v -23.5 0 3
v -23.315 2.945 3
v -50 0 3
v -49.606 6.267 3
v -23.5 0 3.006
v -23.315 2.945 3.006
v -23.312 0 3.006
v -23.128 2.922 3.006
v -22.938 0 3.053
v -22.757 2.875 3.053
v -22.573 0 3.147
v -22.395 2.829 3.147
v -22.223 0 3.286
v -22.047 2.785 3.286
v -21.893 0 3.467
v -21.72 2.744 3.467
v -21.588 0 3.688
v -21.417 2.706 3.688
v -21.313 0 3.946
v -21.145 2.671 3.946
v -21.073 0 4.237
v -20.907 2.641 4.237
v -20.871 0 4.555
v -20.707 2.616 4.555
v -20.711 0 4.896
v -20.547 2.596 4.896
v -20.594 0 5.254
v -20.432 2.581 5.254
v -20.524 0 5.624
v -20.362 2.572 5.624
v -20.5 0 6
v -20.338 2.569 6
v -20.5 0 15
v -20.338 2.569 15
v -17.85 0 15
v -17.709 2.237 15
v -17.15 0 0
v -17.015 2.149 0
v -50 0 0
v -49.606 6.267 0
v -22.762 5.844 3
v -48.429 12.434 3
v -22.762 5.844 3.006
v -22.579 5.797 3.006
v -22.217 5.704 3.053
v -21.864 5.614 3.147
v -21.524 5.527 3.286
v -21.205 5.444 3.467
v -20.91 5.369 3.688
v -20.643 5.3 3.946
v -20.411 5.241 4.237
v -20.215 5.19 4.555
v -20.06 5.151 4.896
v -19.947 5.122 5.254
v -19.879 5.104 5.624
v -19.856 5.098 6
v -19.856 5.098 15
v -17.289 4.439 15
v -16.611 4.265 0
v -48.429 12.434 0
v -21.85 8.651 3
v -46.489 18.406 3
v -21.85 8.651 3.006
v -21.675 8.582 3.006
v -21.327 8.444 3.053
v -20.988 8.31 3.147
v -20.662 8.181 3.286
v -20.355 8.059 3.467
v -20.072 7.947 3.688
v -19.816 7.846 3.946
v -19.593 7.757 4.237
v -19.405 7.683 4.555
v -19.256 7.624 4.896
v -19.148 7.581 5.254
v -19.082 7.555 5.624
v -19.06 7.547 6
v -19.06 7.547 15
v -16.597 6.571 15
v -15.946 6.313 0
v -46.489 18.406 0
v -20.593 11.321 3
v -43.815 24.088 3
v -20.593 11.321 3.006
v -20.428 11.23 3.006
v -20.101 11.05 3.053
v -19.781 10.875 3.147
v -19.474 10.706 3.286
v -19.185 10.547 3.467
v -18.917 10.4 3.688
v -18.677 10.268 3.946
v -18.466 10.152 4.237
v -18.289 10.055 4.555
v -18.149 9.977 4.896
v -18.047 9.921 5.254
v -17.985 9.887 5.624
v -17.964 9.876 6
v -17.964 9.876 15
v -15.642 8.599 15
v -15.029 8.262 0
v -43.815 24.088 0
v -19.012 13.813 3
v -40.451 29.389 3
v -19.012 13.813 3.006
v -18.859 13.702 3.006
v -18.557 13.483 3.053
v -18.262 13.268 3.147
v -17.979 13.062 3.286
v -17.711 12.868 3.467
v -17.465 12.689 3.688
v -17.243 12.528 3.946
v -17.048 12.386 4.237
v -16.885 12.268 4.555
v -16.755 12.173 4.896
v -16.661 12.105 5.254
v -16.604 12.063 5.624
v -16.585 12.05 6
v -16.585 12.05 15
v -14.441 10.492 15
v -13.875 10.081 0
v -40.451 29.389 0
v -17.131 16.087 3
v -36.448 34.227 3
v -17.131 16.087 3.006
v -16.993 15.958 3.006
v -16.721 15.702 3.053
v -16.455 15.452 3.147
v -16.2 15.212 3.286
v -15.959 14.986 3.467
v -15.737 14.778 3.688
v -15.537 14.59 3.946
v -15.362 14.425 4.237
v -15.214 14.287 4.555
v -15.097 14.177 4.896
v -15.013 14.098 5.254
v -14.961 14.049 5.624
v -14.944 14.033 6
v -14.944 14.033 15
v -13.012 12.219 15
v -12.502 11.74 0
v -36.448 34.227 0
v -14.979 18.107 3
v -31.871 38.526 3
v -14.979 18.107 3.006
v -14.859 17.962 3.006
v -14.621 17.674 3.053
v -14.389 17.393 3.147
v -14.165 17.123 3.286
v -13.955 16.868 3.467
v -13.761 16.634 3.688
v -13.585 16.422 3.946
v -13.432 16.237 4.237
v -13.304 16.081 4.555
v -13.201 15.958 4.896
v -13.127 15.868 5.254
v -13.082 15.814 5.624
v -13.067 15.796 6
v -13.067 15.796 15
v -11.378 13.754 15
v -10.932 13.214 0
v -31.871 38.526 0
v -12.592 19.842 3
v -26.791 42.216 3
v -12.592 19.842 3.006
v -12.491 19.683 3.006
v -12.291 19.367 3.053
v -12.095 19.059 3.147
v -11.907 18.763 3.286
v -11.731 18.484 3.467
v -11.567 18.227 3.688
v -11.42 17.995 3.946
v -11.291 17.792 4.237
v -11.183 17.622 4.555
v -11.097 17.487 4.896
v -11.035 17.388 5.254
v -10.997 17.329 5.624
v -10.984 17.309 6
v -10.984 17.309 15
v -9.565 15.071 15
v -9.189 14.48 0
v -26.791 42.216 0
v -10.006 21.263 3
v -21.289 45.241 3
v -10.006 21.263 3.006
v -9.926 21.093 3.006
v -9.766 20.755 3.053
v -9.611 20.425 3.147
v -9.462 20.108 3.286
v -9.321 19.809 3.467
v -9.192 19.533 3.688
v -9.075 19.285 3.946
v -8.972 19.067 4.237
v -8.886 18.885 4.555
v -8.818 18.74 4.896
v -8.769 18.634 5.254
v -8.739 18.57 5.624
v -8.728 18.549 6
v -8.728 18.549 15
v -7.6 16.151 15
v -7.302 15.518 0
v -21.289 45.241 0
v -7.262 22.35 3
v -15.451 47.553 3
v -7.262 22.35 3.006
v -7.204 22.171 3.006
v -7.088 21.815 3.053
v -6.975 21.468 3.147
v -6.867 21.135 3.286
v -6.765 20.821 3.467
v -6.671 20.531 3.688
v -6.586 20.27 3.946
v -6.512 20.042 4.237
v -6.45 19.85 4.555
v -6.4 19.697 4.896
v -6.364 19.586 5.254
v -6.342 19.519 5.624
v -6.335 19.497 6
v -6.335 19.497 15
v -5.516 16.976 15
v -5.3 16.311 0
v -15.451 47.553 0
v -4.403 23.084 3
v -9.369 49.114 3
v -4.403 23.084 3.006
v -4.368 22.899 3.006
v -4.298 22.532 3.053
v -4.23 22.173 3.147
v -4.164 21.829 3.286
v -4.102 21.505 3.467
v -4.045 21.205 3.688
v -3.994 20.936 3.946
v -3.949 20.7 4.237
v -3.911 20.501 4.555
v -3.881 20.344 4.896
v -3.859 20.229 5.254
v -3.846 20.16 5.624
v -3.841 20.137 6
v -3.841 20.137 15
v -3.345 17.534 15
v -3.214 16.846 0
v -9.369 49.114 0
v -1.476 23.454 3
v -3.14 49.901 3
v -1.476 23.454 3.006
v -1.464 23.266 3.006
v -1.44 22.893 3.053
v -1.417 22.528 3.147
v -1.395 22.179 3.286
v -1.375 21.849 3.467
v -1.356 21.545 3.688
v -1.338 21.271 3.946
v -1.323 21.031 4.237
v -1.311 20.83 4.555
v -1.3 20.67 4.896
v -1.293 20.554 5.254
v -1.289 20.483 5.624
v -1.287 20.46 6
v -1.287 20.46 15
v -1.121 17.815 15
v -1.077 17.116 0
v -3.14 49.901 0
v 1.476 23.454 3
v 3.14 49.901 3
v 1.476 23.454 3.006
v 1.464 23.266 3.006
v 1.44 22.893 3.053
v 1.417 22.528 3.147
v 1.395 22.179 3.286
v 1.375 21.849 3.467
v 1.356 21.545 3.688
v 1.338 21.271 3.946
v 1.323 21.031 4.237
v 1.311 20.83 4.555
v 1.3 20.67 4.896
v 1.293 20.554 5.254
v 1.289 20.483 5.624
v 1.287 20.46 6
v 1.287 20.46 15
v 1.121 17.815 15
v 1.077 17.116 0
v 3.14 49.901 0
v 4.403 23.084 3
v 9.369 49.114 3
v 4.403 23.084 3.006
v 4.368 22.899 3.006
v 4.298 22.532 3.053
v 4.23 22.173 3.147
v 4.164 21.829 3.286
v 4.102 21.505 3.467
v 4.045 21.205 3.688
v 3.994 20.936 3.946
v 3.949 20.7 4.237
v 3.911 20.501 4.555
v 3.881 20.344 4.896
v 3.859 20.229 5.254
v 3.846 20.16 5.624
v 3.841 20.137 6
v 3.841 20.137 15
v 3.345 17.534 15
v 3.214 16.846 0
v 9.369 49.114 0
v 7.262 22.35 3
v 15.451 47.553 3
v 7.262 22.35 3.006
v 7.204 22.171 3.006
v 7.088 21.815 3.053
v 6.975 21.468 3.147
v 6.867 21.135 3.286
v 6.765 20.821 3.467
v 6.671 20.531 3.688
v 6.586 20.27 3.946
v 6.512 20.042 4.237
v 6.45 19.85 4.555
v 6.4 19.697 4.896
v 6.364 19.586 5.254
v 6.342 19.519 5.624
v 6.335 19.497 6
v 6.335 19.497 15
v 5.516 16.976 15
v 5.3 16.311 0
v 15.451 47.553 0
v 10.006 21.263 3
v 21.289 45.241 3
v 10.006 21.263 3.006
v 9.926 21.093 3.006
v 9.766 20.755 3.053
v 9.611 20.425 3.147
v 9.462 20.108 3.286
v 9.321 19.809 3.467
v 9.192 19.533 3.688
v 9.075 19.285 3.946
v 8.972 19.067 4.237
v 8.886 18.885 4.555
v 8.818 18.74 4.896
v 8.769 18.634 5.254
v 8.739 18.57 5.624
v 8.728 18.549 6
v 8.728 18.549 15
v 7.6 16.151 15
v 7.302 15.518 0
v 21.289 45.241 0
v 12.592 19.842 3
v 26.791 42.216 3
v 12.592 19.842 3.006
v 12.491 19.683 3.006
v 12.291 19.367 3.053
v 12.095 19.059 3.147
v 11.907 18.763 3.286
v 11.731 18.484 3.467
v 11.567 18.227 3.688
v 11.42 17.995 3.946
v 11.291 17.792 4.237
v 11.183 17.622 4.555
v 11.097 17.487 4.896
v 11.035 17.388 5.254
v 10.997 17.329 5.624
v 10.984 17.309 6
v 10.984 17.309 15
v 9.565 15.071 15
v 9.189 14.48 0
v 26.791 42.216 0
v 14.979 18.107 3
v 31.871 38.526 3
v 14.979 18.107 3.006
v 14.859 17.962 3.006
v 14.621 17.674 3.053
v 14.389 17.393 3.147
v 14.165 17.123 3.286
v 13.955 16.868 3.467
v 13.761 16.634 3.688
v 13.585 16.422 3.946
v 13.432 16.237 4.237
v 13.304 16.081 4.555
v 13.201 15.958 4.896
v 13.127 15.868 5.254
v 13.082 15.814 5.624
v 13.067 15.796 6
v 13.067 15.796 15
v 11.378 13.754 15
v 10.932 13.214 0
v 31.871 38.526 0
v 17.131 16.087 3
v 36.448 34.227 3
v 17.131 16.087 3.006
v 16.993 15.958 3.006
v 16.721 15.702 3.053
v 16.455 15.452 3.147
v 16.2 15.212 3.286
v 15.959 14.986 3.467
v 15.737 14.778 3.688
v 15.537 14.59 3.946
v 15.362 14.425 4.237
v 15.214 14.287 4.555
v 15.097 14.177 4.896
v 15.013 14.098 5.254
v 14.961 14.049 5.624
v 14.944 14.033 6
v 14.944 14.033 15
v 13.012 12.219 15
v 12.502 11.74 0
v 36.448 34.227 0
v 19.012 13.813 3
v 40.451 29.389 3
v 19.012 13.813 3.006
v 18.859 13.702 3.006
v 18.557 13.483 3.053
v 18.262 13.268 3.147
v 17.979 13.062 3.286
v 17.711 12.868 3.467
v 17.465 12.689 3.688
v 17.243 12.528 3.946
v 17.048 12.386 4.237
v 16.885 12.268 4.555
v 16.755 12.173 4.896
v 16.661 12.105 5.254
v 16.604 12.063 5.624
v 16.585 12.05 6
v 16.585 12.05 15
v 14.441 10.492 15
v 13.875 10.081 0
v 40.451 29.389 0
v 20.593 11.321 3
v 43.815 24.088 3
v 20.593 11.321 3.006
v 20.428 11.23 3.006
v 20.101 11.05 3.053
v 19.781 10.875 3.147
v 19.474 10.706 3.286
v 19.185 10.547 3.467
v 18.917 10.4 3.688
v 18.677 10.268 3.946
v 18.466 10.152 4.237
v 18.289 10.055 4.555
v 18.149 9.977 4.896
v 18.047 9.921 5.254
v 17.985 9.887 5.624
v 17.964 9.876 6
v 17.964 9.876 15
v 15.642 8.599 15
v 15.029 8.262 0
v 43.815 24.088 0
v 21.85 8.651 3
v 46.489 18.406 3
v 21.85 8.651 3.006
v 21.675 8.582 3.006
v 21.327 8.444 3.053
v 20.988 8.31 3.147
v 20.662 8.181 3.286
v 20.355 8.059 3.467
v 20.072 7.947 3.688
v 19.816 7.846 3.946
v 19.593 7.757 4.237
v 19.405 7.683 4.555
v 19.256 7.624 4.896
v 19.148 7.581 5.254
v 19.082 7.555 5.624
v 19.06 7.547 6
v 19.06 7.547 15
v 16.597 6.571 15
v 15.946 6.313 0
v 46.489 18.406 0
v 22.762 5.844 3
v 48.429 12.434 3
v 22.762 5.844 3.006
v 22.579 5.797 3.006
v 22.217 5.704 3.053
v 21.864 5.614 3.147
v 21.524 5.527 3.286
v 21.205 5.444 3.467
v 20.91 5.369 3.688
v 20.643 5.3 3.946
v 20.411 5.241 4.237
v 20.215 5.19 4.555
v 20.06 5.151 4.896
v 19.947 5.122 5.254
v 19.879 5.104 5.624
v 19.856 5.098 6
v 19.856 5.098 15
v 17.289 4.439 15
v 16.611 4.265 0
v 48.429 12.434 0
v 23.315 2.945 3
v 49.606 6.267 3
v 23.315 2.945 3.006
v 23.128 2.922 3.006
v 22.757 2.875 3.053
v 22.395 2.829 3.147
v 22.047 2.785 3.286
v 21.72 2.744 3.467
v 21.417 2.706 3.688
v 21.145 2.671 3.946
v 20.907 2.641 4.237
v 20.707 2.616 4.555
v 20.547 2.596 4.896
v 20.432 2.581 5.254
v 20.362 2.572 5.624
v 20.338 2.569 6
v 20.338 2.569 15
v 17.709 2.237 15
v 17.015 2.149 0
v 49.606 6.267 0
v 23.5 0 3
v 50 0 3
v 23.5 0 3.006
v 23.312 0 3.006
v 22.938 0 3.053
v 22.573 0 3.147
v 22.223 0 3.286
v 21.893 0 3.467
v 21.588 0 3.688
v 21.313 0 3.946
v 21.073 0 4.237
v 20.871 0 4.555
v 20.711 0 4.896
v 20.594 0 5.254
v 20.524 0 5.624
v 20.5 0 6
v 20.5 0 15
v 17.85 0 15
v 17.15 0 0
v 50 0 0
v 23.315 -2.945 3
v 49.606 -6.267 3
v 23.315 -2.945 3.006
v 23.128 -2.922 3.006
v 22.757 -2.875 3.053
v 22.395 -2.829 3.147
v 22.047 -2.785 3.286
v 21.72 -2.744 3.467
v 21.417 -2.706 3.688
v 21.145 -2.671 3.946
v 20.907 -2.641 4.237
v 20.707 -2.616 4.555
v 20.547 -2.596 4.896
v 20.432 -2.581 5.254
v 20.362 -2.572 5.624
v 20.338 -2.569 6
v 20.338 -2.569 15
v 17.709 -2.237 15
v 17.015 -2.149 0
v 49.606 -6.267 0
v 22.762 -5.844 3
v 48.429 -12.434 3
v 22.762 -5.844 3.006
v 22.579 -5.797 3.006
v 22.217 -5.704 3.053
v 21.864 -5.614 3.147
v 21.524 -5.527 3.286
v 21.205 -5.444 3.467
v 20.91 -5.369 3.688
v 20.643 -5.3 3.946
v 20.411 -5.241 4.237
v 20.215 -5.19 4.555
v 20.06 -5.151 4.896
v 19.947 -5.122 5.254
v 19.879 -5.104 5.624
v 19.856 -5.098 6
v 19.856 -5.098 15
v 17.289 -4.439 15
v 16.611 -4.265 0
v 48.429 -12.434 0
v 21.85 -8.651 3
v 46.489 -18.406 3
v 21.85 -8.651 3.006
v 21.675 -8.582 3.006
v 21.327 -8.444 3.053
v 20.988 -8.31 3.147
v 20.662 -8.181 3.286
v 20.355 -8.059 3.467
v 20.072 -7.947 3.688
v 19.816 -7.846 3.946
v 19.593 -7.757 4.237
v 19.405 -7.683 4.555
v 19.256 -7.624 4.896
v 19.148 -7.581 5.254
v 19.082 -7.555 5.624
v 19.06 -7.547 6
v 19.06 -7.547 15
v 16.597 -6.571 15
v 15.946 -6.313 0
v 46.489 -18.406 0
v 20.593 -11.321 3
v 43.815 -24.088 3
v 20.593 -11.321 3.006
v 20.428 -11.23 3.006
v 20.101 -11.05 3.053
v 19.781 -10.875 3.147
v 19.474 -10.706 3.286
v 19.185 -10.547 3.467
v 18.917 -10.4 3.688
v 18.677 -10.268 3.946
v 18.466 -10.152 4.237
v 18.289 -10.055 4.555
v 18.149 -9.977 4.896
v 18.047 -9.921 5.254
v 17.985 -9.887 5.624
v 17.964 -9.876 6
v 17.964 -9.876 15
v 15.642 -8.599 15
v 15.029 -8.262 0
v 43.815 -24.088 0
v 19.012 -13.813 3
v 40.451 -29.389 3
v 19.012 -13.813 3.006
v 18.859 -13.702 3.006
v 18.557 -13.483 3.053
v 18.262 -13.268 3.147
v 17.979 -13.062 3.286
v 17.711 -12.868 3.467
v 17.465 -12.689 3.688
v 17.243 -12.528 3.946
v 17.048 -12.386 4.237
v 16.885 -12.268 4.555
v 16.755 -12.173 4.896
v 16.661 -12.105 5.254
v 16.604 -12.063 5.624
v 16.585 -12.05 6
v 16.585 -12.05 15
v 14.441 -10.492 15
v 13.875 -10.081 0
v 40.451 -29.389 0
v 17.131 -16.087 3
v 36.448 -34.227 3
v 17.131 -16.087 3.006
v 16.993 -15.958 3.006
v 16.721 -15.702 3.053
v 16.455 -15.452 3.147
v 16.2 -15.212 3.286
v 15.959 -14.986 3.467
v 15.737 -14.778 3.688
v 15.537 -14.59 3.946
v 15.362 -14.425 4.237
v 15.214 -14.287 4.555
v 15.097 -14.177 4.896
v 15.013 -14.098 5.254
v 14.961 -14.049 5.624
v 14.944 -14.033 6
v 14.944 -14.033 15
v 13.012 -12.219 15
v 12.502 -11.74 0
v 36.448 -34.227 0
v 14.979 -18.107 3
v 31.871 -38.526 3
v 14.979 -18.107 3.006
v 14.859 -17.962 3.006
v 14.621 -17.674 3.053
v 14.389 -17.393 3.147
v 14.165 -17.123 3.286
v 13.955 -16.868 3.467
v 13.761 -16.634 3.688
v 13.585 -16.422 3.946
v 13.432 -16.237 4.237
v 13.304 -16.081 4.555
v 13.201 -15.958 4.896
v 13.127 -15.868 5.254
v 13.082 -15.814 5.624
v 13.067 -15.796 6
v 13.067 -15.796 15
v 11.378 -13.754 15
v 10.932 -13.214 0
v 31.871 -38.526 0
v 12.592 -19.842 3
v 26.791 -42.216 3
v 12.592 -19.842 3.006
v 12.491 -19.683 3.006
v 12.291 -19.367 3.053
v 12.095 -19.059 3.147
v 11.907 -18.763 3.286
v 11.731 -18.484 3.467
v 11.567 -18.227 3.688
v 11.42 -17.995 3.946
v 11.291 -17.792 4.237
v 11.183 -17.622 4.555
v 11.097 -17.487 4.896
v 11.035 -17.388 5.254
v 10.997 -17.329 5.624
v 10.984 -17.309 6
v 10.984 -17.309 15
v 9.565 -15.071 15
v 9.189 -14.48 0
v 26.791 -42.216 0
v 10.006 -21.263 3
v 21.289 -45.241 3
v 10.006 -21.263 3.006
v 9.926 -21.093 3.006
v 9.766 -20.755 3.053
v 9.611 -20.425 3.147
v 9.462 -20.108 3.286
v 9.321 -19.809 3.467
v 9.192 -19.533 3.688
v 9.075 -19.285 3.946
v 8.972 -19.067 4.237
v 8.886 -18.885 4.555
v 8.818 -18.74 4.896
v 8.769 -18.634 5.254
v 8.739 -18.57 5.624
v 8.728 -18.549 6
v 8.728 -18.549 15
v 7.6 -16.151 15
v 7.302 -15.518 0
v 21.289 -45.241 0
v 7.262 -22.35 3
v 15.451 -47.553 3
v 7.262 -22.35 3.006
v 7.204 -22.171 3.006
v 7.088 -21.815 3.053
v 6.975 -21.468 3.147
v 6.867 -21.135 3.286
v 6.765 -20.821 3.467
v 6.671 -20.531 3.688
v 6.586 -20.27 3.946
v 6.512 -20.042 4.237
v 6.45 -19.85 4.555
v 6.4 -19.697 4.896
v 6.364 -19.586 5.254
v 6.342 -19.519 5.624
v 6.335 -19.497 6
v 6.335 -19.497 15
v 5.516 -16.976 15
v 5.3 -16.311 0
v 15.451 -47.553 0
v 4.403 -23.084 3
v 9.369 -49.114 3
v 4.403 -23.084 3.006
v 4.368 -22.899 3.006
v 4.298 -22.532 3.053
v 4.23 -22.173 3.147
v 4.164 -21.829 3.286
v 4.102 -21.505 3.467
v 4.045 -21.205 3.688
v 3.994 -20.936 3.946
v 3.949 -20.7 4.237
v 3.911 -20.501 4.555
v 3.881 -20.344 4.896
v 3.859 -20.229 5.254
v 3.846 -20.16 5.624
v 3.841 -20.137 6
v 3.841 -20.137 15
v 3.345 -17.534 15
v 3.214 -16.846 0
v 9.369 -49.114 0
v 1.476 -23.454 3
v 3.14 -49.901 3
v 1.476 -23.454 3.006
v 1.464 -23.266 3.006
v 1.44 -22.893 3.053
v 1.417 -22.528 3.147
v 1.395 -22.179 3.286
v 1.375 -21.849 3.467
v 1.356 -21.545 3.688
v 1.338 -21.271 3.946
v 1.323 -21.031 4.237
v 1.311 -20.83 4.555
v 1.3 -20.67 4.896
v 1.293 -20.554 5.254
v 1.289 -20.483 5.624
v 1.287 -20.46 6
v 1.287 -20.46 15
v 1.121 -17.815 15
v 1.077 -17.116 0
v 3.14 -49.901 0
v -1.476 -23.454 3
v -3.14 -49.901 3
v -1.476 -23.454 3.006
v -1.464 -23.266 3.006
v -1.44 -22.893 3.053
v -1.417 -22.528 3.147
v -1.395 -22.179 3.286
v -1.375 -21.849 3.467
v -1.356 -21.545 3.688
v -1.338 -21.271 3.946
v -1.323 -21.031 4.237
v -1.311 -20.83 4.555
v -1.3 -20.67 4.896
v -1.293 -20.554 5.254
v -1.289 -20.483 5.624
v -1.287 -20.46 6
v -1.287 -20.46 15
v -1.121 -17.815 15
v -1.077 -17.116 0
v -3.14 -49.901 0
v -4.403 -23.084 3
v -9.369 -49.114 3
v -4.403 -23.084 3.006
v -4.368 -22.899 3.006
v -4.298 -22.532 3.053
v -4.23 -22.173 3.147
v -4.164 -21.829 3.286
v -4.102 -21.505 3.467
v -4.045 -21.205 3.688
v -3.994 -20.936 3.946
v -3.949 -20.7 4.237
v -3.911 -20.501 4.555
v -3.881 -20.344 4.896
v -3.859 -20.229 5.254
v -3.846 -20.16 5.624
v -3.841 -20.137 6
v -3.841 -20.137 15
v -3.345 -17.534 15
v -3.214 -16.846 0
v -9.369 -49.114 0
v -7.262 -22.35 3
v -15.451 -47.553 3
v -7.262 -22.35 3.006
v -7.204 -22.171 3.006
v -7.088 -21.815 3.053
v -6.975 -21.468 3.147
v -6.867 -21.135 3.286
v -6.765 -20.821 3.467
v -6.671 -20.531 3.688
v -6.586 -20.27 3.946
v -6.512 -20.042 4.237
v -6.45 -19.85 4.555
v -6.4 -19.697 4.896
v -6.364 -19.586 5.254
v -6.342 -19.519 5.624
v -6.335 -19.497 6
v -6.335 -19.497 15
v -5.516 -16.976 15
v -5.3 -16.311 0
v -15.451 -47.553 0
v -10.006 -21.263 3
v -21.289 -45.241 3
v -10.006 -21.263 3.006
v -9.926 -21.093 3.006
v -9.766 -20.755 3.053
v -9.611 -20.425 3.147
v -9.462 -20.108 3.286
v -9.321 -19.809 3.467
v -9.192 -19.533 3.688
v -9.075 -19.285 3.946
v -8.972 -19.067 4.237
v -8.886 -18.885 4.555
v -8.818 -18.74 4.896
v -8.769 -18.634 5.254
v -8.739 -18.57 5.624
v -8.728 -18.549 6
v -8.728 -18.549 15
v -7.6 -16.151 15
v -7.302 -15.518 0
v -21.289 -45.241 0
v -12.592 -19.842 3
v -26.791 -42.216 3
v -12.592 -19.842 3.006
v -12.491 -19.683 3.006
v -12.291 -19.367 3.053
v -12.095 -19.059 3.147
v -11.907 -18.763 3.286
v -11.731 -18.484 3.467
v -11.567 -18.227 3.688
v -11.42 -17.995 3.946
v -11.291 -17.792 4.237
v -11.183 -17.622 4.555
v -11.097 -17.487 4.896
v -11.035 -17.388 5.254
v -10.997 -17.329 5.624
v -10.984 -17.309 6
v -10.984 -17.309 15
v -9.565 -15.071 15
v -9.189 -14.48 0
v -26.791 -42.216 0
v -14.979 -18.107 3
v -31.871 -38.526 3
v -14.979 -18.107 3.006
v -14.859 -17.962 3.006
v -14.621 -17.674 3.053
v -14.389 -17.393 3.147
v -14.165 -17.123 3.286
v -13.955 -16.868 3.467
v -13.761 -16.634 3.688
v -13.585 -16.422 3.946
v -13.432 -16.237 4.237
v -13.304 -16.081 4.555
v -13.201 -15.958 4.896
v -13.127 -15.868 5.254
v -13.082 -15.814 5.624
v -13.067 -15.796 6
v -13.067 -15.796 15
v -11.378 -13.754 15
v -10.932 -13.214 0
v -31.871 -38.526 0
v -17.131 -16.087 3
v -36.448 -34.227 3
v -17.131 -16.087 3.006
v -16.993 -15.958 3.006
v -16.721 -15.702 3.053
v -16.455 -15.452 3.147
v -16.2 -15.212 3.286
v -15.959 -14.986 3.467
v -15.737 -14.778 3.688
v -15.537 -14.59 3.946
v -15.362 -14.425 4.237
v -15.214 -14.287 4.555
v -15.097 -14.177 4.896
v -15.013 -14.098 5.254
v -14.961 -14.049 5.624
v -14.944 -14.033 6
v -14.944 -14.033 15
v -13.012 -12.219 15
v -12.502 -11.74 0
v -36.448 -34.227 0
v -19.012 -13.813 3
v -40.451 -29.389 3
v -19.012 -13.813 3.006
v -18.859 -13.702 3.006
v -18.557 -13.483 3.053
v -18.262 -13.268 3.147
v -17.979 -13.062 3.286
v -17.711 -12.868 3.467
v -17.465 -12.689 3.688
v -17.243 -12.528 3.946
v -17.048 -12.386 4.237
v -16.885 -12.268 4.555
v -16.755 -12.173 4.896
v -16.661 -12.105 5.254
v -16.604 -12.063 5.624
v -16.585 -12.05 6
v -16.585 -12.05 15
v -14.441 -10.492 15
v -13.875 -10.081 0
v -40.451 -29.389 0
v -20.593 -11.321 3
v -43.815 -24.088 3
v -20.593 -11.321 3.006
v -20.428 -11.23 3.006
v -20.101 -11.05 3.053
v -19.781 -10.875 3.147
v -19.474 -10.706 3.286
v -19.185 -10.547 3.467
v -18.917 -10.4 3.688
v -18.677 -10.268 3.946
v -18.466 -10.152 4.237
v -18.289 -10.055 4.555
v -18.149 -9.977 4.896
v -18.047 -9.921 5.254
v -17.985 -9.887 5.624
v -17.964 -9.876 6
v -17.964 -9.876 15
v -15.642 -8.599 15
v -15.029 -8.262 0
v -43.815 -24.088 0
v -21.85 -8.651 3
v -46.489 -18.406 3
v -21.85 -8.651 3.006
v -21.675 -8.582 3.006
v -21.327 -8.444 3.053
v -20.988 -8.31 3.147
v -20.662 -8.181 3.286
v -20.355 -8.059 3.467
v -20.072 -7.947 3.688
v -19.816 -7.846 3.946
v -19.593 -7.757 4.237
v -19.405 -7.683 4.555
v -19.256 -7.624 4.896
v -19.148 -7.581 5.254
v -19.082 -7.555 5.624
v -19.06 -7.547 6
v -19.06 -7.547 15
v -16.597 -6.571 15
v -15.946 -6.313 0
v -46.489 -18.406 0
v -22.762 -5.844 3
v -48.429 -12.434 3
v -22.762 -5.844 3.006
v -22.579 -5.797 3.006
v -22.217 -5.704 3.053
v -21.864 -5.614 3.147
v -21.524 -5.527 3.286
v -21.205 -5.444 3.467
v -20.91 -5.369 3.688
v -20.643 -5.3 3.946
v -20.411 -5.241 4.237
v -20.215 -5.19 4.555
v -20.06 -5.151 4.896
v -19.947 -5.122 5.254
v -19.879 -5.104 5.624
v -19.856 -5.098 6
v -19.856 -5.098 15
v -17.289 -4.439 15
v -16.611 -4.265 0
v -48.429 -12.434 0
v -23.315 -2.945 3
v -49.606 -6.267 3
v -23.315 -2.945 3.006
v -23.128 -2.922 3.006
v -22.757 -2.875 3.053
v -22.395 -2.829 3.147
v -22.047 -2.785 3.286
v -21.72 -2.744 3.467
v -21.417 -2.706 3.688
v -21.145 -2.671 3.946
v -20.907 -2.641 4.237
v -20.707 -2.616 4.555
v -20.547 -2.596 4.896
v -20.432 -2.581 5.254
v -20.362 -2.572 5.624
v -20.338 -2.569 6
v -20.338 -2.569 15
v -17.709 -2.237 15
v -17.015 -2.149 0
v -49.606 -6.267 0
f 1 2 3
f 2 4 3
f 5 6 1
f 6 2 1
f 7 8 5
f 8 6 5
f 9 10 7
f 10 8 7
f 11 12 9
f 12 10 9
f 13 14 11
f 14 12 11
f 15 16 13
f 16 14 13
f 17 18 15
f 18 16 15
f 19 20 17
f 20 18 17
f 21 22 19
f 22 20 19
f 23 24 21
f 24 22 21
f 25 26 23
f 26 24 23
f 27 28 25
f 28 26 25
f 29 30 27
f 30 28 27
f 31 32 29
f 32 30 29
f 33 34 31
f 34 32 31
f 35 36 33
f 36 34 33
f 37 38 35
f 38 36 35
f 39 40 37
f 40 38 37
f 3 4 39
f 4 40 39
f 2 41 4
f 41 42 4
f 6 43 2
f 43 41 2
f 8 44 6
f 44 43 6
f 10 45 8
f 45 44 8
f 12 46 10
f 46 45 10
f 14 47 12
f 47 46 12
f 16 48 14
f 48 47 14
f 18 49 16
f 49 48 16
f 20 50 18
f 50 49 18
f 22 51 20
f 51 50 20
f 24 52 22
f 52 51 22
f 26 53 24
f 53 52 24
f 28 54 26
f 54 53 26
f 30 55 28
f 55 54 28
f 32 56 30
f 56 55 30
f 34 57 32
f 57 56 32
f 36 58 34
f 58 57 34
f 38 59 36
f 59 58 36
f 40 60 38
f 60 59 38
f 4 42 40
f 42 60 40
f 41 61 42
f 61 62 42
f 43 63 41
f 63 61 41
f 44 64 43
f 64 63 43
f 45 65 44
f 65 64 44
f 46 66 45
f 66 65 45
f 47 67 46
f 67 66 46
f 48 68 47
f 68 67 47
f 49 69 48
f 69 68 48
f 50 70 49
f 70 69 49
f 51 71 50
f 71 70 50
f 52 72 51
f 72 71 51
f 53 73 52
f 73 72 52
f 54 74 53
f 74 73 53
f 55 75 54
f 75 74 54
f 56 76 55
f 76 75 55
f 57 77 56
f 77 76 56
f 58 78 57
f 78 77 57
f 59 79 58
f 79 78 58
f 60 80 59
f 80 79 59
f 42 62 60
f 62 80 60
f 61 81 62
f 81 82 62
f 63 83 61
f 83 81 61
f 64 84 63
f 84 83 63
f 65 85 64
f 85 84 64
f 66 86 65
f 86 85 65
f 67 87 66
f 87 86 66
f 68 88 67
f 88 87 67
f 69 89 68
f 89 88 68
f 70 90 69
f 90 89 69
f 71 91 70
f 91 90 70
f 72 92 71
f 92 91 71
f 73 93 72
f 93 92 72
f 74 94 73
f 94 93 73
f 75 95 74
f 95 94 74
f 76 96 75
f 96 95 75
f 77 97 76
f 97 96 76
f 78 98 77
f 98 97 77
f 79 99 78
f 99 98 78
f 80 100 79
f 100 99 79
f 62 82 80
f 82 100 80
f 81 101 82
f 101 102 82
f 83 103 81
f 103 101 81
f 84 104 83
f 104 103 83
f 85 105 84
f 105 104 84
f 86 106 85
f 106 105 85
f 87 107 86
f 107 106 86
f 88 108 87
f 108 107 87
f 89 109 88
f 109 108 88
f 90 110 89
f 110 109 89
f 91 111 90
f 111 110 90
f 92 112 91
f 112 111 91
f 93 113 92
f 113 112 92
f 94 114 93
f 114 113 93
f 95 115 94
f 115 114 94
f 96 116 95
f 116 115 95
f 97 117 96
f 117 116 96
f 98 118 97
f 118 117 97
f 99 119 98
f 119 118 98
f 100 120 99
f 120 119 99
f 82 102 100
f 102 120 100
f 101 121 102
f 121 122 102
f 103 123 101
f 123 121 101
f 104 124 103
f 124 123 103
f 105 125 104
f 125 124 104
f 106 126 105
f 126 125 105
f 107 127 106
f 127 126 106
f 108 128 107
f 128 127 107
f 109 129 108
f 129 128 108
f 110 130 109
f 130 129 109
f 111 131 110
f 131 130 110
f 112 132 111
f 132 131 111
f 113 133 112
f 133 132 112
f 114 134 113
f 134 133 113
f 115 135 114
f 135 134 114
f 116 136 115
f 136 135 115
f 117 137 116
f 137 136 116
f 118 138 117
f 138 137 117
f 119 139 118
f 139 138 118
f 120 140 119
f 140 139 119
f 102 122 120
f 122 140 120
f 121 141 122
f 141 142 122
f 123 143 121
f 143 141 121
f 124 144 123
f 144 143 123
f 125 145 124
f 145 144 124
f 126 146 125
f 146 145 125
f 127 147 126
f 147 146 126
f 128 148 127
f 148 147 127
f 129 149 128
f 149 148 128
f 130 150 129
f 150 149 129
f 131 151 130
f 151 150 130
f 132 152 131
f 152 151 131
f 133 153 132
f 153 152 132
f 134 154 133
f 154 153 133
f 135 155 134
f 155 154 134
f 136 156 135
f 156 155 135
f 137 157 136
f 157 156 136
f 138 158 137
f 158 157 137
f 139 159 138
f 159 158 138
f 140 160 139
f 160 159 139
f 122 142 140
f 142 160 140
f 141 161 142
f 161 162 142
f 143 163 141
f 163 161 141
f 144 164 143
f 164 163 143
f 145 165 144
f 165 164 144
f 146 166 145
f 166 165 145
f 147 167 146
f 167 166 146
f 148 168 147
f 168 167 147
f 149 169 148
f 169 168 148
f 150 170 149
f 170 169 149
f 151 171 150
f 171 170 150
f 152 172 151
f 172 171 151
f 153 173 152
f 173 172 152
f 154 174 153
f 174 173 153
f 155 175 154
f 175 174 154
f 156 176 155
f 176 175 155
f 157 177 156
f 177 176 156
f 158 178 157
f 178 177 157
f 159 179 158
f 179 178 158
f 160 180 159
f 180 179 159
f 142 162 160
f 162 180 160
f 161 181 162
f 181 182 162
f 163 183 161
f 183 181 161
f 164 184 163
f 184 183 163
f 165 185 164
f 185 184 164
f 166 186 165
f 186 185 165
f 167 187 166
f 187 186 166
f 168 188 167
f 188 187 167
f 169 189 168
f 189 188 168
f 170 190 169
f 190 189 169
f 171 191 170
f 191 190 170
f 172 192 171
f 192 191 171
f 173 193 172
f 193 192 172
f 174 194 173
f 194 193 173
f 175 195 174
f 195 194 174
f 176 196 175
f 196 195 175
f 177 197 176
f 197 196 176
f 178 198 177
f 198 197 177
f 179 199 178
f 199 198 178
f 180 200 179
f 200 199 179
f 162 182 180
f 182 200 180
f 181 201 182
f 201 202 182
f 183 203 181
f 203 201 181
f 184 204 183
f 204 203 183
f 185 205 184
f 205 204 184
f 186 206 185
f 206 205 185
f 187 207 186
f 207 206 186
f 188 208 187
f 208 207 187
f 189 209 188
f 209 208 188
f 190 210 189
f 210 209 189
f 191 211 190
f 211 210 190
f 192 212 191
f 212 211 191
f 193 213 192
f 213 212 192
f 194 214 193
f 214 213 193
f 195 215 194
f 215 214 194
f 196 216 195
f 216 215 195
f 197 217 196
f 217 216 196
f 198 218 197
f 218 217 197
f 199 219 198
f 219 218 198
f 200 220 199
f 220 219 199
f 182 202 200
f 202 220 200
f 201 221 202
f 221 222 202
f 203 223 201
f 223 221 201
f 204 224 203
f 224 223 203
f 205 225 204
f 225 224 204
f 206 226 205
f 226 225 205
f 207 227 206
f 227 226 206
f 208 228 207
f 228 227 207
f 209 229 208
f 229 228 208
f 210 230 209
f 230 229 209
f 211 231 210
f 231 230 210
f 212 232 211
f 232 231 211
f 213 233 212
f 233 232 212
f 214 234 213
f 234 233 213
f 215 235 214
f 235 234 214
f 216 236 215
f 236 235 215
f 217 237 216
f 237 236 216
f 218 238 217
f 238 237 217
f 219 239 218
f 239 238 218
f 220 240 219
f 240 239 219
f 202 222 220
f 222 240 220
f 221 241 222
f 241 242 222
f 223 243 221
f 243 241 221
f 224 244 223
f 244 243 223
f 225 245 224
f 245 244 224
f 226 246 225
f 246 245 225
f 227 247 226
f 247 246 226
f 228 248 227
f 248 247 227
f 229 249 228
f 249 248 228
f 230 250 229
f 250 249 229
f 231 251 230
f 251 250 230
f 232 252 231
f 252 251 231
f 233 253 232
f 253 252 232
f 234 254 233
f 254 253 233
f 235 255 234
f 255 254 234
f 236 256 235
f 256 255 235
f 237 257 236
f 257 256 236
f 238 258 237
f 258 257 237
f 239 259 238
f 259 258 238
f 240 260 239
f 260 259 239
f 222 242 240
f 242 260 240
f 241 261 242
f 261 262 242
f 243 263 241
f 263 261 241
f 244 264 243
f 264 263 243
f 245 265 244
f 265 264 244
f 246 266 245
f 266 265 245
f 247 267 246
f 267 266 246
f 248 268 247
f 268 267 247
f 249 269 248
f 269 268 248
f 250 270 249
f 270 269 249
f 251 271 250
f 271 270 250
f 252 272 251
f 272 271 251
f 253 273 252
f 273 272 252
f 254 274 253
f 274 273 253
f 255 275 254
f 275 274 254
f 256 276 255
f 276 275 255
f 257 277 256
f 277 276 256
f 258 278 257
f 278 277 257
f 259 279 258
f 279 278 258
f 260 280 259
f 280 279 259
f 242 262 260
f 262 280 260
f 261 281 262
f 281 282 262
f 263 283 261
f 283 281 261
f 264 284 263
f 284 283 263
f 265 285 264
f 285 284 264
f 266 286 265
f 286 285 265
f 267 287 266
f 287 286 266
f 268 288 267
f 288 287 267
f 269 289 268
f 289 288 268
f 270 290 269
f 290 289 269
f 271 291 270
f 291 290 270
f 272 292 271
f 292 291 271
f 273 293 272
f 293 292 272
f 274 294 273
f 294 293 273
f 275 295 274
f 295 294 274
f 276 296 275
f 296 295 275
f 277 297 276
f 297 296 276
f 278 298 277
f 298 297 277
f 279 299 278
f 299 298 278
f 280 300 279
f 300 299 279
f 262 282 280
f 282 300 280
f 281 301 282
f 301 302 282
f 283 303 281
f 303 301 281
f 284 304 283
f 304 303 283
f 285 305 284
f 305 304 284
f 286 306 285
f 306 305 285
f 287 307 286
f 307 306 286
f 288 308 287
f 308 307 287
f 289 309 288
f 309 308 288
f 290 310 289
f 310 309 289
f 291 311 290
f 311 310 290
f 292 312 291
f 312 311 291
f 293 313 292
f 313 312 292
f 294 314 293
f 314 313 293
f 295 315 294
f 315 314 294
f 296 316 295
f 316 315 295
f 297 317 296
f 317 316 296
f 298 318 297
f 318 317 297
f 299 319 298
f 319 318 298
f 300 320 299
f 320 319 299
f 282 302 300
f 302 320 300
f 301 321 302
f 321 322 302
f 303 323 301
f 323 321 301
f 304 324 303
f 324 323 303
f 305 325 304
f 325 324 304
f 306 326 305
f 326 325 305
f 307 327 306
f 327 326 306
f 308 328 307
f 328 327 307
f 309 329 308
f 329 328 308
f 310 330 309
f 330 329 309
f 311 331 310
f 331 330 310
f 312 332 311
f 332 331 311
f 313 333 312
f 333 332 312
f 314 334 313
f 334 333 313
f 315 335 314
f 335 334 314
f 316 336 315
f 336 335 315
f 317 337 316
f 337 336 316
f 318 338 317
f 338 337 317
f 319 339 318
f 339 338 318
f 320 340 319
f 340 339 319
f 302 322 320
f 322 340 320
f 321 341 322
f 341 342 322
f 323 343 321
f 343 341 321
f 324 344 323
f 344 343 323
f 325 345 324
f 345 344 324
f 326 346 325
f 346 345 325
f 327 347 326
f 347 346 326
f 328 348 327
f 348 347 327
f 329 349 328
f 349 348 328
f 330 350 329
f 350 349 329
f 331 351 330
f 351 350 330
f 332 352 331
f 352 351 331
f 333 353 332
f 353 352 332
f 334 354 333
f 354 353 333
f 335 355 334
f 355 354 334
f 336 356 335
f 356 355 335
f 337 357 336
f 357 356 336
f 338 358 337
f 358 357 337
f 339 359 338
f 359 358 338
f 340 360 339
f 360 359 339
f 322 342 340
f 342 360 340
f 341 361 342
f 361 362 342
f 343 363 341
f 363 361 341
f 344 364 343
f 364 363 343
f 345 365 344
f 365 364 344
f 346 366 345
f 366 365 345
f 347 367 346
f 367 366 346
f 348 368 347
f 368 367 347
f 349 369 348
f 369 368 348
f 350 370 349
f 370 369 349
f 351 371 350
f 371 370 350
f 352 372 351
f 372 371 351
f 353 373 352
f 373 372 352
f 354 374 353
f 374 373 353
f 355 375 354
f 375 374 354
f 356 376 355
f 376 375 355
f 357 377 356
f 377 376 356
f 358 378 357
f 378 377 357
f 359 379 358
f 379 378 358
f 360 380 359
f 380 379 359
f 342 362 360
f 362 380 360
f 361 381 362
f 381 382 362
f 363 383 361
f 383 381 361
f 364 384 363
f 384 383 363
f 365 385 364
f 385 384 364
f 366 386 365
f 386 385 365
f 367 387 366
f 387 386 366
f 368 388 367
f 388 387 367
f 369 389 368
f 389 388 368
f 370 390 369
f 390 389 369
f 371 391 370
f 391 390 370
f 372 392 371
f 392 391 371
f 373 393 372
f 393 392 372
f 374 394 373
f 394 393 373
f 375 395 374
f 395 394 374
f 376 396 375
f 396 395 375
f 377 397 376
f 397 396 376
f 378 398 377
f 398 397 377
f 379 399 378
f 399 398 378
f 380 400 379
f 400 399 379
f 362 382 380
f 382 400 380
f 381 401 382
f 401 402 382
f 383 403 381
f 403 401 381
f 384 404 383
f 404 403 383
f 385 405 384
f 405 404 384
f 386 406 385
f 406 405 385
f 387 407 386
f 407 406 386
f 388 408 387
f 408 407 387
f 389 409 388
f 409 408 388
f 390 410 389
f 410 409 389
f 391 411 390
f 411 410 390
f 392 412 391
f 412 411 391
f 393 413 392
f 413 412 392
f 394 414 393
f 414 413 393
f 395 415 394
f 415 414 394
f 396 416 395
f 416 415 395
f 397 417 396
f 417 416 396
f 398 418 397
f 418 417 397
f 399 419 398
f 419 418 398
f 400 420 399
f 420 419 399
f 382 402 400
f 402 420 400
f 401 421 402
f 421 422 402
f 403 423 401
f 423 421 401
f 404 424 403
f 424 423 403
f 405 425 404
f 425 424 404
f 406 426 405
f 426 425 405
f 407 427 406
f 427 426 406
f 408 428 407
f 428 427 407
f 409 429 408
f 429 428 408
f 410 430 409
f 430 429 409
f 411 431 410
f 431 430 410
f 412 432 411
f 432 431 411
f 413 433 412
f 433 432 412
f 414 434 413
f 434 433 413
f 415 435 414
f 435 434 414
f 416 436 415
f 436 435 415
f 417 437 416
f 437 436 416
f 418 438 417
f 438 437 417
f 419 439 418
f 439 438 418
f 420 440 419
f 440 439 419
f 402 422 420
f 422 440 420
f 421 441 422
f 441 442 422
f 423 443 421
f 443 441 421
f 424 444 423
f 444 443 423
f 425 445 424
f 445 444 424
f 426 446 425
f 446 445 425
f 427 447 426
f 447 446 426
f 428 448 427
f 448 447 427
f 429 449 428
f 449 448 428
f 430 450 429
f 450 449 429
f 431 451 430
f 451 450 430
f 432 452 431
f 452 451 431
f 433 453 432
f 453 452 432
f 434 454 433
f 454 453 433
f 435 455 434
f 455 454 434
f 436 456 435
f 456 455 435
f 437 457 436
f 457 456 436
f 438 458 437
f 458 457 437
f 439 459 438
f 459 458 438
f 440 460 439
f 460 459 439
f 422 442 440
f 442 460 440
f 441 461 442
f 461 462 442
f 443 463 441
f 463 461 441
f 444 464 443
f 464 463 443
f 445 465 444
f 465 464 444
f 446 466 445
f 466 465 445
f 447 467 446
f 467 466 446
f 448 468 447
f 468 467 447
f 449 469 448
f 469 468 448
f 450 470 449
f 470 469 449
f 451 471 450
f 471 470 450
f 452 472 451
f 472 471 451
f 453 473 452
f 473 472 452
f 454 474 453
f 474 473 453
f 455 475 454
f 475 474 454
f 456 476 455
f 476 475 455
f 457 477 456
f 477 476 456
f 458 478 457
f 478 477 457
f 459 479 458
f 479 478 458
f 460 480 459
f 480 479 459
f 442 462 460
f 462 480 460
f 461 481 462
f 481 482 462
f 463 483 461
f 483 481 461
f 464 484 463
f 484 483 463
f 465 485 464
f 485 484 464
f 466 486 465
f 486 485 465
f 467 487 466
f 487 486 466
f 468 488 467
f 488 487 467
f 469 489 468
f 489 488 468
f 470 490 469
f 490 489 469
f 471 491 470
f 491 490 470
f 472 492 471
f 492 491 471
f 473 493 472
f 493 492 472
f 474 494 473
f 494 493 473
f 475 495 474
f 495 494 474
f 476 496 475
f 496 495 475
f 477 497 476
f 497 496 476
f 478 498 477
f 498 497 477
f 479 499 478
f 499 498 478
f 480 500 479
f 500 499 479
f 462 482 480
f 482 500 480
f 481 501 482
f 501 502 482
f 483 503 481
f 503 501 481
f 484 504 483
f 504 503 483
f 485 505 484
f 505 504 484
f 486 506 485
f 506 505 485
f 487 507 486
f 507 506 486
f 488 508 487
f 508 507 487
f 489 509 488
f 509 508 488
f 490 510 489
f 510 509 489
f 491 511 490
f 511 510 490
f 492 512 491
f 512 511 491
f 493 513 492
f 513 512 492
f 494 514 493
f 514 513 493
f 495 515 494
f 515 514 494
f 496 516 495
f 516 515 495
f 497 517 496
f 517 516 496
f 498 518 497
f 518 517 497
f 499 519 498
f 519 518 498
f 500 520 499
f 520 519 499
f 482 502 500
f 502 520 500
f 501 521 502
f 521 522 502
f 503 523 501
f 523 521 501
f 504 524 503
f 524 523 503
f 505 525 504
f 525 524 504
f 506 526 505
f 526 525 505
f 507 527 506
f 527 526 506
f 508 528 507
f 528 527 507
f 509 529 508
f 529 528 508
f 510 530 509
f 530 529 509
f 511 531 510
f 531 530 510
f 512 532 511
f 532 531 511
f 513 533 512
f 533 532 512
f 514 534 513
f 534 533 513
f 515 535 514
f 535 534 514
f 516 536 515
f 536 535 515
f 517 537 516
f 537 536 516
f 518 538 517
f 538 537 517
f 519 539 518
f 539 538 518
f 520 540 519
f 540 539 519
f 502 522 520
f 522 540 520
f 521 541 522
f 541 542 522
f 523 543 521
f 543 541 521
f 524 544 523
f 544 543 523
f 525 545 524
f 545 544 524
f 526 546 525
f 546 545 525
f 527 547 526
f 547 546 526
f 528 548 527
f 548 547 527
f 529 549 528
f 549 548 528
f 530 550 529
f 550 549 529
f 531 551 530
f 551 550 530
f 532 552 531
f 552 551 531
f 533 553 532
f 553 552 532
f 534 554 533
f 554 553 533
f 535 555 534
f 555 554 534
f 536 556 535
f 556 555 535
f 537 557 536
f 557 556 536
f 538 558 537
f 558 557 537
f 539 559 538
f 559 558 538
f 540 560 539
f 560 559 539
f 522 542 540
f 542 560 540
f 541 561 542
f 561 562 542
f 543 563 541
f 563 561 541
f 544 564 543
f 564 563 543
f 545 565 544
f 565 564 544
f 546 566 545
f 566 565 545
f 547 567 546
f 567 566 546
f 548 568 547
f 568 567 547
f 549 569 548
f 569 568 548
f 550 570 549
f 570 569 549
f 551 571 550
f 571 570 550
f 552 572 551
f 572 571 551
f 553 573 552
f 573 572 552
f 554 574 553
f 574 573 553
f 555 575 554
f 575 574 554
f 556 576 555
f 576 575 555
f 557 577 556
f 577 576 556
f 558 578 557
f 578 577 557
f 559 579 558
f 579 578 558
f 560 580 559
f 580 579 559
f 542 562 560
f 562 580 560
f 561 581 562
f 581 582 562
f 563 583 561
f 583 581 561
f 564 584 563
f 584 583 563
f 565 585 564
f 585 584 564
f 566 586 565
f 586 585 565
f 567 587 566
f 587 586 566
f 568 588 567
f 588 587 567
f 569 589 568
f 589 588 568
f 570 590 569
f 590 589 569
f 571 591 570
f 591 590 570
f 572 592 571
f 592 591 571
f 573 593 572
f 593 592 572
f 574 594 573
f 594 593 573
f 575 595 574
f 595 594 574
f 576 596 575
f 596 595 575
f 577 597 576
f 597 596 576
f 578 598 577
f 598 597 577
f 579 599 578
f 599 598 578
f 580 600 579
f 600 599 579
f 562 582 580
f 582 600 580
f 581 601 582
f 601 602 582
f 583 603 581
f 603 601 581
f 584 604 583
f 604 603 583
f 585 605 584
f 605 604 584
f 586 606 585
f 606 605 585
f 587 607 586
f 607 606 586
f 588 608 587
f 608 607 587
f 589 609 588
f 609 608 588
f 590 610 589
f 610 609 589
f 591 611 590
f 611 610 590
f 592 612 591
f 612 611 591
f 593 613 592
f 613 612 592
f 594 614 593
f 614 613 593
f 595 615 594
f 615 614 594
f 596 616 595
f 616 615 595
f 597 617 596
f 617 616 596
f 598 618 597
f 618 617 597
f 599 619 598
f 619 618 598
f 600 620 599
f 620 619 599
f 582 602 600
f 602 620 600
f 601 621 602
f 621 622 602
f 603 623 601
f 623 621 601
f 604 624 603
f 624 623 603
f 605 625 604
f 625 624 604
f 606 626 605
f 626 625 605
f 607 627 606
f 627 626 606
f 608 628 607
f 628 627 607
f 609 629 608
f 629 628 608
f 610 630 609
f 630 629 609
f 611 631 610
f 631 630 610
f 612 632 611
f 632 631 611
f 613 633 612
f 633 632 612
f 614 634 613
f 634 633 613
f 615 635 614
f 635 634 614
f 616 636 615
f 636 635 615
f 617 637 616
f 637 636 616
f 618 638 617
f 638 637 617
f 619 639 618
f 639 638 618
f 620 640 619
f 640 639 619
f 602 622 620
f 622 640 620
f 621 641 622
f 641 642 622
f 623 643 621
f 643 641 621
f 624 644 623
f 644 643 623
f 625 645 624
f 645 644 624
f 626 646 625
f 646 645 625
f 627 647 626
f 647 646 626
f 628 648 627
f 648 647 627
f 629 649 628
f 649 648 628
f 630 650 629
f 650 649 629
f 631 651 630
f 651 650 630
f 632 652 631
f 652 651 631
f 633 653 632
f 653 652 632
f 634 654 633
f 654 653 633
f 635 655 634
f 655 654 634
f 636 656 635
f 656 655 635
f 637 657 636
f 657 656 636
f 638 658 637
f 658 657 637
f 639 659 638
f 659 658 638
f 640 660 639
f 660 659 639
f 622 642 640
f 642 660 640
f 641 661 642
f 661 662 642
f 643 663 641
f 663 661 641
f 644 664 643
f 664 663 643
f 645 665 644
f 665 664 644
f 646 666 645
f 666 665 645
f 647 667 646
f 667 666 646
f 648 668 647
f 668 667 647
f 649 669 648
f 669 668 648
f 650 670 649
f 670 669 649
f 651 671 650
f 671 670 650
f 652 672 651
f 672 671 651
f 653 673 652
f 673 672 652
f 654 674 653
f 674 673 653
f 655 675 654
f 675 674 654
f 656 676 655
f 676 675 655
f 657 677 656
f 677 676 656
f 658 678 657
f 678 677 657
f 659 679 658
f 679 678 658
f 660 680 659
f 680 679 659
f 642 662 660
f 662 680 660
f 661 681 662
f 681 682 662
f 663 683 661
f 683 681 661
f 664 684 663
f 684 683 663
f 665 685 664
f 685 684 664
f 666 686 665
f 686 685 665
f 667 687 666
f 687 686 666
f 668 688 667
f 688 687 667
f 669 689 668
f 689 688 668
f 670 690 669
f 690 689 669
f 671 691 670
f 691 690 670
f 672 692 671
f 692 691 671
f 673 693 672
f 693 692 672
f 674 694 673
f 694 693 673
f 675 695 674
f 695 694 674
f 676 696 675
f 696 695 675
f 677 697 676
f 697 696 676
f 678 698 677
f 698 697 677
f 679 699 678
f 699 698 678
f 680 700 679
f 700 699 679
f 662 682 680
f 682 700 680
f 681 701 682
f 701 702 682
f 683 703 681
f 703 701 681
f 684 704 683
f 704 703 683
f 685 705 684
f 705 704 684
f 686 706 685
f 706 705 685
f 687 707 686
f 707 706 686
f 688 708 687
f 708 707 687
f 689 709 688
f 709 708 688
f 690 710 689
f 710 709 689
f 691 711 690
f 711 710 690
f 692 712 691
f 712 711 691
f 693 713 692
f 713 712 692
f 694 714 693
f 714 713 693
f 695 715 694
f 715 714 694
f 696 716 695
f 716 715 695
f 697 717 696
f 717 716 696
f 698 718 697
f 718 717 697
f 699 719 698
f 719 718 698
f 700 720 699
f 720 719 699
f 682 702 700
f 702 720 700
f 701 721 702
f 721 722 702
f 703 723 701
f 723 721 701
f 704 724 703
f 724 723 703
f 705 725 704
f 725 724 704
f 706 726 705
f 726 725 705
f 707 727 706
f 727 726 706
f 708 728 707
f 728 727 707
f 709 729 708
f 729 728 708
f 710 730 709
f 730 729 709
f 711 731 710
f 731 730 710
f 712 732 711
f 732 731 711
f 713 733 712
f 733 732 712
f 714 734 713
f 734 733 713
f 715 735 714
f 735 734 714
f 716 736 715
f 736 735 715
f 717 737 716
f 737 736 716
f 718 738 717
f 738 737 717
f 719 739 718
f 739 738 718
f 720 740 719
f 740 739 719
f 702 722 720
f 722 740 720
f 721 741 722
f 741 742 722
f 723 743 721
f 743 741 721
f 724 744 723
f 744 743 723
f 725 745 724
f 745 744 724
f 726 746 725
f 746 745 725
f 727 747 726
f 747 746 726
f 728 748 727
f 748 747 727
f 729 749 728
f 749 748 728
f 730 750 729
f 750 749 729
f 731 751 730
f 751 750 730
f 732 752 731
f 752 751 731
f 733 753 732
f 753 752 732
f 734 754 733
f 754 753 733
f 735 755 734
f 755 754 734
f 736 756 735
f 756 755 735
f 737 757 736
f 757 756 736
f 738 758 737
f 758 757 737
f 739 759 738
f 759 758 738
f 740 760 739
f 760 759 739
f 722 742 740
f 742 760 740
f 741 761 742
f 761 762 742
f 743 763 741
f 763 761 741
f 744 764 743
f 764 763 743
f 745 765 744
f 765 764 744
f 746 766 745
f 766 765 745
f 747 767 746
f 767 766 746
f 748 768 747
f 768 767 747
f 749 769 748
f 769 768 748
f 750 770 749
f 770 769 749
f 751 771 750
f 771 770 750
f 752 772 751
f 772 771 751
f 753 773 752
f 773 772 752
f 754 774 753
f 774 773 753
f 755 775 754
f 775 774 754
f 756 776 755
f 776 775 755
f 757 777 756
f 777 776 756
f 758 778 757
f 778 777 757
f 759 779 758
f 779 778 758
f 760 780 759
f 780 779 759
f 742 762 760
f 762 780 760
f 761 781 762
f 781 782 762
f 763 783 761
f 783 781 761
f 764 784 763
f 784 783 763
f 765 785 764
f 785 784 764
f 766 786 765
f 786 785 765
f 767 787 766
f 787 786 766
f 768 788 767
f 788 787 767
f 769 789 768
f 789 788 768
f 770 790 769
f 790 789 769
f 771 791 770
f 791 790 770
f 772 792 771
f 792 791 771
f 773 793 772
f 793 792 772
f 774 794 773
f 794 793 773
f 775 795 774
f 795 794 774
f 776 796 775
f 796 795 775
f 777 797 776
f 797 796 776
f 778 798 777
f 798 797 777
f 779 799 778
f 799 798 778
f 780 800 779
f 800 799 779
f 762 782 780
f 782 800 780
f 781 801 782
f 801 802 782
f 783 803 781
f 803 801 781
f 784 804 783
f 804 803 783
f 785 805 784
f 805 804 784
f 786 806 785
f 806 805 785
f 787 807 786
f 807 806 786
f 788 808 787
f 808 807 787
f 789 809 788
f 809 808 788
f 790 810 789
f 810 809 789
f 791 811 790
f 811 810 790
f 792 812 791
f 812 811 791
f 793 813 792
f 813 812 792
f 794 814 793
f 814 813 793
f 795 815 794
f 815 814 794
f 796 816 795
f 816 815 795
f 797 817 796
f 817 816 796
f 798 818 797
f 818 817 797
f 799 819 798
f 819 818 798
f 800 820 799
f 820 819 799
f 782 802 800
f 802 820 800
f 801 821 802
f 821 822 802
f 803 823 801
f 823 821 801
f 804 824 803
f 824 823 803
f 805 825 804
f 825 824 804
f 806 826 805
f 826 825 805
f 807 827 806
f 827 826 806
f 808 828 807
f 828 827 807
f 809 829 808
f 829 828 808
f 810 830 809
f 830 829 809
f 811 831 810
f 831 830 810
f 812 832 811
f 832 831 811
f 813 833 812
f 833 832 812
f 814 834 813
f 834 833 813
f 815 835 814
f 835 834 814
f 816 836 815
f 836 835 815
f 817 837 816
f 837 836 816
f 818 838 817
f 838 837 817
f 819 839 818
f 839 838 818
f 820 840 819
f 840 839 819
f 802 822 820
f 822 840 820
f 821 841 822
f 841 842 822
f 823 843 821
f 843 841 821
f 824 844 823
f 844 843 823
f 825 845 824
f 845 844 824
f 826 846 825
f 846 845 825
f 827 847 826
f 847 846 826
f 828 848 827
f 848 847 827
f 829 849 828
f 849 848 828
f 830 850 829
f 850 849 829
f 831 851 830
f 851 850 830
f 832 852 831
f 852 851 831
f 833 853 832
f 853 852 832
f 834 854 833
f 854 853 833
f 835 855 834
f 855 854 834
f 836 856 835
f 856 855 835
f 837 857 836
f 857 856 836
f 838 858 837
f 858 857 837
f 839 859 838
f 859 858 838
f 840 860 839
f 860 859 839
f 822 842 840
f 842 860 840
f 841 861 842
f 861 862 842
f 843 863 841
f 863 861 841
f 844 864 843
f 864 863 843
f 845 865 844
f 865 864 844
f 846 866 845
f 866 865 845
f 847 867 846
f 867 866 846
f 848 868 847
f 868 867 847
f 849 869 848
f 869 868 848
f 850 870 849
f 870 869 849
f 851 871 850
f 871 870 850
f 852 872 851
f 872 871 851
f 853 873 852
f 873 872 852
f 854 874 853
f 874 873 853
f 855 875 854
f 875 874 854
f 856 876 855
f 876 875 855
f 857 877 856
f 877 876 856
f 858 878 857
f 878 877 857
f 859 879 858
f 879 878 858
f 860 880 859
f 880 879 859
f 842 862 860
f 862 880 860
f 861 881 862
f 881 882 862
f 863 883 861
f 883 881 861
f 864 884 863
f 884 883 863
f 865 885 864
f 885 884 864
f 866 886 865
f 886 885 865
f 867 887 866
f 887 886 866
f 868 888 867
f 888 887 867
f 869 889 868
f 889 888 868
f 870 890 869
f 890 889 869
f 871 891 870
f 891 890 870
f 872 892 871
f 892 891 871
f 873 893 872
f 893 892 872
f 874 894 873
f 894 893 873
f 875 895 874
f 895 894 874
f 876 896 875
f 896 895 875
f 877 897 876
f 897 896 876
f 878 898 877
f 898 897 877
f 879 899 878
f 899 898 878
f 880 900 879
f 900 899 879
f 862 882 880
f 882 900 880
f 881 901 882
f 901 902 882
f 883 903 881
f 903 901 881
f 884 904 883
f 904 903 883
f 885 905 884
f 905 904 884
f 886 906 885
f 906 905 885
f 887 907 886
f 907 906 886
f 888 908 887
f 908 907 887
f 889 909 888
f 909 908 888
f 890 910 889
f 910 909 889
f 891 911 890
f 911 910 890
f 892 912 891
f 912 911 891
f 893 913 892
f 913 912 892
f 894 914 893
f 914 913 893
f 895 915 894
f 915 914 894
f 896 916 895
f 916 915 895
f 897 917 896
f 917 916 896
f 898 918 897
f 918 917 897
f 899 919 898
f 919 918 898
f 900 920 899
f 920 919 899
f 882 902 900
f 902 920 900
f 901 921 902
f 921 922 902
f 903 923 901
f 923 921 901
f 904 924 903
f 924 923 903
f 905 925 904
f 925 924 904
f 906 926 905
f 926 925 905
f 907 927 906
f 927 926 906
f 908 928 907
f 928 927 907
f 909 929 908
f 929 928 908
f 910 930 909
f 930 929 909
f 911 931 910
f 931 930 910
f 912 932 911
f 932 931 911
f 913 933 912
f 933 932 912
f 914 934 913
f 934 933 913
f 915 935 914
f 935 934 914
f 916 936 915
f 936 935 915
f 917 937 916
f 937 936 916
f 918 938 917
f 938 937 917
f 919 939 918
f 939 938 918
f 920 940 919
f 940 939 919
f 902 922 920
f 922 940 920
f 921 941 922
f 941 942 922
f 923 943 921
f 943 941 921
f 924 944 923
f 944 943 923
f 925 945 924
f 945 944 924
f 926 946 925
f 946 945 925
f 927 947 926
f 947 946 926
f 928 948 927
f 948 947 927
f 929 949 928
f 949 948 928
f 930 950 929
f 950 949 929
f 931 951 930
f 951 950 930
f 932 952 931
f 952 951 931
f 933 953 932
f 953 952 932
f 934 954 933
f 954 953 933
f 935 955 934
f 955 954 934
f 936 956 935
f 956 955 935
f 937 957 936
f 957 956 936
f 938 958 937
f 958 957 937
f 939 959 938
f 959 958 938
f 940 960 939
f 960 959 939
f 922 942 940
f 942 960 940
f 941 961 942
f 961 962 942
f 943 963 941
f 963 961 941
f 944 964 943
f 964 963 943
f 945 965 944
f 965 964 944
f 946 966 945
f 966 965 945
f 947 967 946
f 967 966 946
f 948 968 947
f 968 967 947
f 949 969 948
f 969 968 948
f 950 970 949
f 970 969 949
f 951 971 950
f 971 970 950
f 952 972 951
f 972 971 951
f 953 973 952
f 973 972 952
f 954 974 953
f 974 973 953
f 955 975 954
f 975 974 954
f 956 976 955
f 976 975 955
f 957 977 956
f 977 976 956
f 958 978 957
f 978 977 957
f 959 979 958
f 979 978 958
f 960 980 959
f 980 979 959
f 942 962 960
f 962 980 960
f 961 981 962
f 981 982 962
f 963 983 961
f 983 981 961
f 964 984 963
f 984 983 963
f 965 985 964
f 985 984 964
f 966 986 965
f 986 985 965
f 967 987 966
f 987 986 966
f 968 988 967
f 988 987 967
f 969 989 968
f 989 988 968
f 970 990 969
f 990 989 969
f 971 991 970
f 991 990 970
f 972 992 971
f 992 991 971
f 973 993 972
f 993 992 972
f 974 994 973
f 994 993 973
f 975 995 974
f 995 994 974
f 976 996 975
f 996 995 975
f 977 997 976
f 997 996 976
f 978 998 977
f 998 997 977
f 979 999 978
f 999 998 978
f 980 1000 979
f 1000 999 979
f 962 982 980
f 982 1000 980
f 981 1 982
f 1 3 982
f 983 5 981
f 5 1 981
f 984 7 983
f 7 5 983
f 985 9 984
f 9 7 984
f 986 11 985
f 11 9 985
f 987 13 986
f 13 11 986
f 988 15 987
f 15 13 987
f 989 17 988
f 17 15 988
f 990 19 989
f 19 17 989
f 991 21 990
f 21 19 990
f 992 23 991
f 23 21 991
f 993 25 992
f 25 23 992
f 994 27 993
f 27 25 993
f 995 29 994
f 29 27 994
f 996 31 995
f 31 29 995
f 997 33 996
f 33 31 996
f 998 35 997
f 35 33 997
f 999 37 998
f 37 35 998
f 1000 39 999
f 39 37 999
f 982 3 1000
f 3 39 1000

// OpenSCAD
D_ext = 100;
D_int = 35;
H_ext = 3;
H_int = 15;

module profile() {
    r = H_ext*2;
    delta = 0.7;
    union() {
        square([(D_ext-D_int)/2, H_ext]);
        //square([H_ext, H_int]);
        polygon(points = [
            [-delta/2,0],
            [delta/2, H_int],
            [H_ext, H_int],
            [H_ext, 0]]);
        difference() {
            translate([0, 0]) square([r, r]);
            translate([r, r]) circle(d=r);
        }
    }
}

$fn = 50;
rotate_extrude(angle = 360)
    translate([D_int/2, 0])
        profile();
